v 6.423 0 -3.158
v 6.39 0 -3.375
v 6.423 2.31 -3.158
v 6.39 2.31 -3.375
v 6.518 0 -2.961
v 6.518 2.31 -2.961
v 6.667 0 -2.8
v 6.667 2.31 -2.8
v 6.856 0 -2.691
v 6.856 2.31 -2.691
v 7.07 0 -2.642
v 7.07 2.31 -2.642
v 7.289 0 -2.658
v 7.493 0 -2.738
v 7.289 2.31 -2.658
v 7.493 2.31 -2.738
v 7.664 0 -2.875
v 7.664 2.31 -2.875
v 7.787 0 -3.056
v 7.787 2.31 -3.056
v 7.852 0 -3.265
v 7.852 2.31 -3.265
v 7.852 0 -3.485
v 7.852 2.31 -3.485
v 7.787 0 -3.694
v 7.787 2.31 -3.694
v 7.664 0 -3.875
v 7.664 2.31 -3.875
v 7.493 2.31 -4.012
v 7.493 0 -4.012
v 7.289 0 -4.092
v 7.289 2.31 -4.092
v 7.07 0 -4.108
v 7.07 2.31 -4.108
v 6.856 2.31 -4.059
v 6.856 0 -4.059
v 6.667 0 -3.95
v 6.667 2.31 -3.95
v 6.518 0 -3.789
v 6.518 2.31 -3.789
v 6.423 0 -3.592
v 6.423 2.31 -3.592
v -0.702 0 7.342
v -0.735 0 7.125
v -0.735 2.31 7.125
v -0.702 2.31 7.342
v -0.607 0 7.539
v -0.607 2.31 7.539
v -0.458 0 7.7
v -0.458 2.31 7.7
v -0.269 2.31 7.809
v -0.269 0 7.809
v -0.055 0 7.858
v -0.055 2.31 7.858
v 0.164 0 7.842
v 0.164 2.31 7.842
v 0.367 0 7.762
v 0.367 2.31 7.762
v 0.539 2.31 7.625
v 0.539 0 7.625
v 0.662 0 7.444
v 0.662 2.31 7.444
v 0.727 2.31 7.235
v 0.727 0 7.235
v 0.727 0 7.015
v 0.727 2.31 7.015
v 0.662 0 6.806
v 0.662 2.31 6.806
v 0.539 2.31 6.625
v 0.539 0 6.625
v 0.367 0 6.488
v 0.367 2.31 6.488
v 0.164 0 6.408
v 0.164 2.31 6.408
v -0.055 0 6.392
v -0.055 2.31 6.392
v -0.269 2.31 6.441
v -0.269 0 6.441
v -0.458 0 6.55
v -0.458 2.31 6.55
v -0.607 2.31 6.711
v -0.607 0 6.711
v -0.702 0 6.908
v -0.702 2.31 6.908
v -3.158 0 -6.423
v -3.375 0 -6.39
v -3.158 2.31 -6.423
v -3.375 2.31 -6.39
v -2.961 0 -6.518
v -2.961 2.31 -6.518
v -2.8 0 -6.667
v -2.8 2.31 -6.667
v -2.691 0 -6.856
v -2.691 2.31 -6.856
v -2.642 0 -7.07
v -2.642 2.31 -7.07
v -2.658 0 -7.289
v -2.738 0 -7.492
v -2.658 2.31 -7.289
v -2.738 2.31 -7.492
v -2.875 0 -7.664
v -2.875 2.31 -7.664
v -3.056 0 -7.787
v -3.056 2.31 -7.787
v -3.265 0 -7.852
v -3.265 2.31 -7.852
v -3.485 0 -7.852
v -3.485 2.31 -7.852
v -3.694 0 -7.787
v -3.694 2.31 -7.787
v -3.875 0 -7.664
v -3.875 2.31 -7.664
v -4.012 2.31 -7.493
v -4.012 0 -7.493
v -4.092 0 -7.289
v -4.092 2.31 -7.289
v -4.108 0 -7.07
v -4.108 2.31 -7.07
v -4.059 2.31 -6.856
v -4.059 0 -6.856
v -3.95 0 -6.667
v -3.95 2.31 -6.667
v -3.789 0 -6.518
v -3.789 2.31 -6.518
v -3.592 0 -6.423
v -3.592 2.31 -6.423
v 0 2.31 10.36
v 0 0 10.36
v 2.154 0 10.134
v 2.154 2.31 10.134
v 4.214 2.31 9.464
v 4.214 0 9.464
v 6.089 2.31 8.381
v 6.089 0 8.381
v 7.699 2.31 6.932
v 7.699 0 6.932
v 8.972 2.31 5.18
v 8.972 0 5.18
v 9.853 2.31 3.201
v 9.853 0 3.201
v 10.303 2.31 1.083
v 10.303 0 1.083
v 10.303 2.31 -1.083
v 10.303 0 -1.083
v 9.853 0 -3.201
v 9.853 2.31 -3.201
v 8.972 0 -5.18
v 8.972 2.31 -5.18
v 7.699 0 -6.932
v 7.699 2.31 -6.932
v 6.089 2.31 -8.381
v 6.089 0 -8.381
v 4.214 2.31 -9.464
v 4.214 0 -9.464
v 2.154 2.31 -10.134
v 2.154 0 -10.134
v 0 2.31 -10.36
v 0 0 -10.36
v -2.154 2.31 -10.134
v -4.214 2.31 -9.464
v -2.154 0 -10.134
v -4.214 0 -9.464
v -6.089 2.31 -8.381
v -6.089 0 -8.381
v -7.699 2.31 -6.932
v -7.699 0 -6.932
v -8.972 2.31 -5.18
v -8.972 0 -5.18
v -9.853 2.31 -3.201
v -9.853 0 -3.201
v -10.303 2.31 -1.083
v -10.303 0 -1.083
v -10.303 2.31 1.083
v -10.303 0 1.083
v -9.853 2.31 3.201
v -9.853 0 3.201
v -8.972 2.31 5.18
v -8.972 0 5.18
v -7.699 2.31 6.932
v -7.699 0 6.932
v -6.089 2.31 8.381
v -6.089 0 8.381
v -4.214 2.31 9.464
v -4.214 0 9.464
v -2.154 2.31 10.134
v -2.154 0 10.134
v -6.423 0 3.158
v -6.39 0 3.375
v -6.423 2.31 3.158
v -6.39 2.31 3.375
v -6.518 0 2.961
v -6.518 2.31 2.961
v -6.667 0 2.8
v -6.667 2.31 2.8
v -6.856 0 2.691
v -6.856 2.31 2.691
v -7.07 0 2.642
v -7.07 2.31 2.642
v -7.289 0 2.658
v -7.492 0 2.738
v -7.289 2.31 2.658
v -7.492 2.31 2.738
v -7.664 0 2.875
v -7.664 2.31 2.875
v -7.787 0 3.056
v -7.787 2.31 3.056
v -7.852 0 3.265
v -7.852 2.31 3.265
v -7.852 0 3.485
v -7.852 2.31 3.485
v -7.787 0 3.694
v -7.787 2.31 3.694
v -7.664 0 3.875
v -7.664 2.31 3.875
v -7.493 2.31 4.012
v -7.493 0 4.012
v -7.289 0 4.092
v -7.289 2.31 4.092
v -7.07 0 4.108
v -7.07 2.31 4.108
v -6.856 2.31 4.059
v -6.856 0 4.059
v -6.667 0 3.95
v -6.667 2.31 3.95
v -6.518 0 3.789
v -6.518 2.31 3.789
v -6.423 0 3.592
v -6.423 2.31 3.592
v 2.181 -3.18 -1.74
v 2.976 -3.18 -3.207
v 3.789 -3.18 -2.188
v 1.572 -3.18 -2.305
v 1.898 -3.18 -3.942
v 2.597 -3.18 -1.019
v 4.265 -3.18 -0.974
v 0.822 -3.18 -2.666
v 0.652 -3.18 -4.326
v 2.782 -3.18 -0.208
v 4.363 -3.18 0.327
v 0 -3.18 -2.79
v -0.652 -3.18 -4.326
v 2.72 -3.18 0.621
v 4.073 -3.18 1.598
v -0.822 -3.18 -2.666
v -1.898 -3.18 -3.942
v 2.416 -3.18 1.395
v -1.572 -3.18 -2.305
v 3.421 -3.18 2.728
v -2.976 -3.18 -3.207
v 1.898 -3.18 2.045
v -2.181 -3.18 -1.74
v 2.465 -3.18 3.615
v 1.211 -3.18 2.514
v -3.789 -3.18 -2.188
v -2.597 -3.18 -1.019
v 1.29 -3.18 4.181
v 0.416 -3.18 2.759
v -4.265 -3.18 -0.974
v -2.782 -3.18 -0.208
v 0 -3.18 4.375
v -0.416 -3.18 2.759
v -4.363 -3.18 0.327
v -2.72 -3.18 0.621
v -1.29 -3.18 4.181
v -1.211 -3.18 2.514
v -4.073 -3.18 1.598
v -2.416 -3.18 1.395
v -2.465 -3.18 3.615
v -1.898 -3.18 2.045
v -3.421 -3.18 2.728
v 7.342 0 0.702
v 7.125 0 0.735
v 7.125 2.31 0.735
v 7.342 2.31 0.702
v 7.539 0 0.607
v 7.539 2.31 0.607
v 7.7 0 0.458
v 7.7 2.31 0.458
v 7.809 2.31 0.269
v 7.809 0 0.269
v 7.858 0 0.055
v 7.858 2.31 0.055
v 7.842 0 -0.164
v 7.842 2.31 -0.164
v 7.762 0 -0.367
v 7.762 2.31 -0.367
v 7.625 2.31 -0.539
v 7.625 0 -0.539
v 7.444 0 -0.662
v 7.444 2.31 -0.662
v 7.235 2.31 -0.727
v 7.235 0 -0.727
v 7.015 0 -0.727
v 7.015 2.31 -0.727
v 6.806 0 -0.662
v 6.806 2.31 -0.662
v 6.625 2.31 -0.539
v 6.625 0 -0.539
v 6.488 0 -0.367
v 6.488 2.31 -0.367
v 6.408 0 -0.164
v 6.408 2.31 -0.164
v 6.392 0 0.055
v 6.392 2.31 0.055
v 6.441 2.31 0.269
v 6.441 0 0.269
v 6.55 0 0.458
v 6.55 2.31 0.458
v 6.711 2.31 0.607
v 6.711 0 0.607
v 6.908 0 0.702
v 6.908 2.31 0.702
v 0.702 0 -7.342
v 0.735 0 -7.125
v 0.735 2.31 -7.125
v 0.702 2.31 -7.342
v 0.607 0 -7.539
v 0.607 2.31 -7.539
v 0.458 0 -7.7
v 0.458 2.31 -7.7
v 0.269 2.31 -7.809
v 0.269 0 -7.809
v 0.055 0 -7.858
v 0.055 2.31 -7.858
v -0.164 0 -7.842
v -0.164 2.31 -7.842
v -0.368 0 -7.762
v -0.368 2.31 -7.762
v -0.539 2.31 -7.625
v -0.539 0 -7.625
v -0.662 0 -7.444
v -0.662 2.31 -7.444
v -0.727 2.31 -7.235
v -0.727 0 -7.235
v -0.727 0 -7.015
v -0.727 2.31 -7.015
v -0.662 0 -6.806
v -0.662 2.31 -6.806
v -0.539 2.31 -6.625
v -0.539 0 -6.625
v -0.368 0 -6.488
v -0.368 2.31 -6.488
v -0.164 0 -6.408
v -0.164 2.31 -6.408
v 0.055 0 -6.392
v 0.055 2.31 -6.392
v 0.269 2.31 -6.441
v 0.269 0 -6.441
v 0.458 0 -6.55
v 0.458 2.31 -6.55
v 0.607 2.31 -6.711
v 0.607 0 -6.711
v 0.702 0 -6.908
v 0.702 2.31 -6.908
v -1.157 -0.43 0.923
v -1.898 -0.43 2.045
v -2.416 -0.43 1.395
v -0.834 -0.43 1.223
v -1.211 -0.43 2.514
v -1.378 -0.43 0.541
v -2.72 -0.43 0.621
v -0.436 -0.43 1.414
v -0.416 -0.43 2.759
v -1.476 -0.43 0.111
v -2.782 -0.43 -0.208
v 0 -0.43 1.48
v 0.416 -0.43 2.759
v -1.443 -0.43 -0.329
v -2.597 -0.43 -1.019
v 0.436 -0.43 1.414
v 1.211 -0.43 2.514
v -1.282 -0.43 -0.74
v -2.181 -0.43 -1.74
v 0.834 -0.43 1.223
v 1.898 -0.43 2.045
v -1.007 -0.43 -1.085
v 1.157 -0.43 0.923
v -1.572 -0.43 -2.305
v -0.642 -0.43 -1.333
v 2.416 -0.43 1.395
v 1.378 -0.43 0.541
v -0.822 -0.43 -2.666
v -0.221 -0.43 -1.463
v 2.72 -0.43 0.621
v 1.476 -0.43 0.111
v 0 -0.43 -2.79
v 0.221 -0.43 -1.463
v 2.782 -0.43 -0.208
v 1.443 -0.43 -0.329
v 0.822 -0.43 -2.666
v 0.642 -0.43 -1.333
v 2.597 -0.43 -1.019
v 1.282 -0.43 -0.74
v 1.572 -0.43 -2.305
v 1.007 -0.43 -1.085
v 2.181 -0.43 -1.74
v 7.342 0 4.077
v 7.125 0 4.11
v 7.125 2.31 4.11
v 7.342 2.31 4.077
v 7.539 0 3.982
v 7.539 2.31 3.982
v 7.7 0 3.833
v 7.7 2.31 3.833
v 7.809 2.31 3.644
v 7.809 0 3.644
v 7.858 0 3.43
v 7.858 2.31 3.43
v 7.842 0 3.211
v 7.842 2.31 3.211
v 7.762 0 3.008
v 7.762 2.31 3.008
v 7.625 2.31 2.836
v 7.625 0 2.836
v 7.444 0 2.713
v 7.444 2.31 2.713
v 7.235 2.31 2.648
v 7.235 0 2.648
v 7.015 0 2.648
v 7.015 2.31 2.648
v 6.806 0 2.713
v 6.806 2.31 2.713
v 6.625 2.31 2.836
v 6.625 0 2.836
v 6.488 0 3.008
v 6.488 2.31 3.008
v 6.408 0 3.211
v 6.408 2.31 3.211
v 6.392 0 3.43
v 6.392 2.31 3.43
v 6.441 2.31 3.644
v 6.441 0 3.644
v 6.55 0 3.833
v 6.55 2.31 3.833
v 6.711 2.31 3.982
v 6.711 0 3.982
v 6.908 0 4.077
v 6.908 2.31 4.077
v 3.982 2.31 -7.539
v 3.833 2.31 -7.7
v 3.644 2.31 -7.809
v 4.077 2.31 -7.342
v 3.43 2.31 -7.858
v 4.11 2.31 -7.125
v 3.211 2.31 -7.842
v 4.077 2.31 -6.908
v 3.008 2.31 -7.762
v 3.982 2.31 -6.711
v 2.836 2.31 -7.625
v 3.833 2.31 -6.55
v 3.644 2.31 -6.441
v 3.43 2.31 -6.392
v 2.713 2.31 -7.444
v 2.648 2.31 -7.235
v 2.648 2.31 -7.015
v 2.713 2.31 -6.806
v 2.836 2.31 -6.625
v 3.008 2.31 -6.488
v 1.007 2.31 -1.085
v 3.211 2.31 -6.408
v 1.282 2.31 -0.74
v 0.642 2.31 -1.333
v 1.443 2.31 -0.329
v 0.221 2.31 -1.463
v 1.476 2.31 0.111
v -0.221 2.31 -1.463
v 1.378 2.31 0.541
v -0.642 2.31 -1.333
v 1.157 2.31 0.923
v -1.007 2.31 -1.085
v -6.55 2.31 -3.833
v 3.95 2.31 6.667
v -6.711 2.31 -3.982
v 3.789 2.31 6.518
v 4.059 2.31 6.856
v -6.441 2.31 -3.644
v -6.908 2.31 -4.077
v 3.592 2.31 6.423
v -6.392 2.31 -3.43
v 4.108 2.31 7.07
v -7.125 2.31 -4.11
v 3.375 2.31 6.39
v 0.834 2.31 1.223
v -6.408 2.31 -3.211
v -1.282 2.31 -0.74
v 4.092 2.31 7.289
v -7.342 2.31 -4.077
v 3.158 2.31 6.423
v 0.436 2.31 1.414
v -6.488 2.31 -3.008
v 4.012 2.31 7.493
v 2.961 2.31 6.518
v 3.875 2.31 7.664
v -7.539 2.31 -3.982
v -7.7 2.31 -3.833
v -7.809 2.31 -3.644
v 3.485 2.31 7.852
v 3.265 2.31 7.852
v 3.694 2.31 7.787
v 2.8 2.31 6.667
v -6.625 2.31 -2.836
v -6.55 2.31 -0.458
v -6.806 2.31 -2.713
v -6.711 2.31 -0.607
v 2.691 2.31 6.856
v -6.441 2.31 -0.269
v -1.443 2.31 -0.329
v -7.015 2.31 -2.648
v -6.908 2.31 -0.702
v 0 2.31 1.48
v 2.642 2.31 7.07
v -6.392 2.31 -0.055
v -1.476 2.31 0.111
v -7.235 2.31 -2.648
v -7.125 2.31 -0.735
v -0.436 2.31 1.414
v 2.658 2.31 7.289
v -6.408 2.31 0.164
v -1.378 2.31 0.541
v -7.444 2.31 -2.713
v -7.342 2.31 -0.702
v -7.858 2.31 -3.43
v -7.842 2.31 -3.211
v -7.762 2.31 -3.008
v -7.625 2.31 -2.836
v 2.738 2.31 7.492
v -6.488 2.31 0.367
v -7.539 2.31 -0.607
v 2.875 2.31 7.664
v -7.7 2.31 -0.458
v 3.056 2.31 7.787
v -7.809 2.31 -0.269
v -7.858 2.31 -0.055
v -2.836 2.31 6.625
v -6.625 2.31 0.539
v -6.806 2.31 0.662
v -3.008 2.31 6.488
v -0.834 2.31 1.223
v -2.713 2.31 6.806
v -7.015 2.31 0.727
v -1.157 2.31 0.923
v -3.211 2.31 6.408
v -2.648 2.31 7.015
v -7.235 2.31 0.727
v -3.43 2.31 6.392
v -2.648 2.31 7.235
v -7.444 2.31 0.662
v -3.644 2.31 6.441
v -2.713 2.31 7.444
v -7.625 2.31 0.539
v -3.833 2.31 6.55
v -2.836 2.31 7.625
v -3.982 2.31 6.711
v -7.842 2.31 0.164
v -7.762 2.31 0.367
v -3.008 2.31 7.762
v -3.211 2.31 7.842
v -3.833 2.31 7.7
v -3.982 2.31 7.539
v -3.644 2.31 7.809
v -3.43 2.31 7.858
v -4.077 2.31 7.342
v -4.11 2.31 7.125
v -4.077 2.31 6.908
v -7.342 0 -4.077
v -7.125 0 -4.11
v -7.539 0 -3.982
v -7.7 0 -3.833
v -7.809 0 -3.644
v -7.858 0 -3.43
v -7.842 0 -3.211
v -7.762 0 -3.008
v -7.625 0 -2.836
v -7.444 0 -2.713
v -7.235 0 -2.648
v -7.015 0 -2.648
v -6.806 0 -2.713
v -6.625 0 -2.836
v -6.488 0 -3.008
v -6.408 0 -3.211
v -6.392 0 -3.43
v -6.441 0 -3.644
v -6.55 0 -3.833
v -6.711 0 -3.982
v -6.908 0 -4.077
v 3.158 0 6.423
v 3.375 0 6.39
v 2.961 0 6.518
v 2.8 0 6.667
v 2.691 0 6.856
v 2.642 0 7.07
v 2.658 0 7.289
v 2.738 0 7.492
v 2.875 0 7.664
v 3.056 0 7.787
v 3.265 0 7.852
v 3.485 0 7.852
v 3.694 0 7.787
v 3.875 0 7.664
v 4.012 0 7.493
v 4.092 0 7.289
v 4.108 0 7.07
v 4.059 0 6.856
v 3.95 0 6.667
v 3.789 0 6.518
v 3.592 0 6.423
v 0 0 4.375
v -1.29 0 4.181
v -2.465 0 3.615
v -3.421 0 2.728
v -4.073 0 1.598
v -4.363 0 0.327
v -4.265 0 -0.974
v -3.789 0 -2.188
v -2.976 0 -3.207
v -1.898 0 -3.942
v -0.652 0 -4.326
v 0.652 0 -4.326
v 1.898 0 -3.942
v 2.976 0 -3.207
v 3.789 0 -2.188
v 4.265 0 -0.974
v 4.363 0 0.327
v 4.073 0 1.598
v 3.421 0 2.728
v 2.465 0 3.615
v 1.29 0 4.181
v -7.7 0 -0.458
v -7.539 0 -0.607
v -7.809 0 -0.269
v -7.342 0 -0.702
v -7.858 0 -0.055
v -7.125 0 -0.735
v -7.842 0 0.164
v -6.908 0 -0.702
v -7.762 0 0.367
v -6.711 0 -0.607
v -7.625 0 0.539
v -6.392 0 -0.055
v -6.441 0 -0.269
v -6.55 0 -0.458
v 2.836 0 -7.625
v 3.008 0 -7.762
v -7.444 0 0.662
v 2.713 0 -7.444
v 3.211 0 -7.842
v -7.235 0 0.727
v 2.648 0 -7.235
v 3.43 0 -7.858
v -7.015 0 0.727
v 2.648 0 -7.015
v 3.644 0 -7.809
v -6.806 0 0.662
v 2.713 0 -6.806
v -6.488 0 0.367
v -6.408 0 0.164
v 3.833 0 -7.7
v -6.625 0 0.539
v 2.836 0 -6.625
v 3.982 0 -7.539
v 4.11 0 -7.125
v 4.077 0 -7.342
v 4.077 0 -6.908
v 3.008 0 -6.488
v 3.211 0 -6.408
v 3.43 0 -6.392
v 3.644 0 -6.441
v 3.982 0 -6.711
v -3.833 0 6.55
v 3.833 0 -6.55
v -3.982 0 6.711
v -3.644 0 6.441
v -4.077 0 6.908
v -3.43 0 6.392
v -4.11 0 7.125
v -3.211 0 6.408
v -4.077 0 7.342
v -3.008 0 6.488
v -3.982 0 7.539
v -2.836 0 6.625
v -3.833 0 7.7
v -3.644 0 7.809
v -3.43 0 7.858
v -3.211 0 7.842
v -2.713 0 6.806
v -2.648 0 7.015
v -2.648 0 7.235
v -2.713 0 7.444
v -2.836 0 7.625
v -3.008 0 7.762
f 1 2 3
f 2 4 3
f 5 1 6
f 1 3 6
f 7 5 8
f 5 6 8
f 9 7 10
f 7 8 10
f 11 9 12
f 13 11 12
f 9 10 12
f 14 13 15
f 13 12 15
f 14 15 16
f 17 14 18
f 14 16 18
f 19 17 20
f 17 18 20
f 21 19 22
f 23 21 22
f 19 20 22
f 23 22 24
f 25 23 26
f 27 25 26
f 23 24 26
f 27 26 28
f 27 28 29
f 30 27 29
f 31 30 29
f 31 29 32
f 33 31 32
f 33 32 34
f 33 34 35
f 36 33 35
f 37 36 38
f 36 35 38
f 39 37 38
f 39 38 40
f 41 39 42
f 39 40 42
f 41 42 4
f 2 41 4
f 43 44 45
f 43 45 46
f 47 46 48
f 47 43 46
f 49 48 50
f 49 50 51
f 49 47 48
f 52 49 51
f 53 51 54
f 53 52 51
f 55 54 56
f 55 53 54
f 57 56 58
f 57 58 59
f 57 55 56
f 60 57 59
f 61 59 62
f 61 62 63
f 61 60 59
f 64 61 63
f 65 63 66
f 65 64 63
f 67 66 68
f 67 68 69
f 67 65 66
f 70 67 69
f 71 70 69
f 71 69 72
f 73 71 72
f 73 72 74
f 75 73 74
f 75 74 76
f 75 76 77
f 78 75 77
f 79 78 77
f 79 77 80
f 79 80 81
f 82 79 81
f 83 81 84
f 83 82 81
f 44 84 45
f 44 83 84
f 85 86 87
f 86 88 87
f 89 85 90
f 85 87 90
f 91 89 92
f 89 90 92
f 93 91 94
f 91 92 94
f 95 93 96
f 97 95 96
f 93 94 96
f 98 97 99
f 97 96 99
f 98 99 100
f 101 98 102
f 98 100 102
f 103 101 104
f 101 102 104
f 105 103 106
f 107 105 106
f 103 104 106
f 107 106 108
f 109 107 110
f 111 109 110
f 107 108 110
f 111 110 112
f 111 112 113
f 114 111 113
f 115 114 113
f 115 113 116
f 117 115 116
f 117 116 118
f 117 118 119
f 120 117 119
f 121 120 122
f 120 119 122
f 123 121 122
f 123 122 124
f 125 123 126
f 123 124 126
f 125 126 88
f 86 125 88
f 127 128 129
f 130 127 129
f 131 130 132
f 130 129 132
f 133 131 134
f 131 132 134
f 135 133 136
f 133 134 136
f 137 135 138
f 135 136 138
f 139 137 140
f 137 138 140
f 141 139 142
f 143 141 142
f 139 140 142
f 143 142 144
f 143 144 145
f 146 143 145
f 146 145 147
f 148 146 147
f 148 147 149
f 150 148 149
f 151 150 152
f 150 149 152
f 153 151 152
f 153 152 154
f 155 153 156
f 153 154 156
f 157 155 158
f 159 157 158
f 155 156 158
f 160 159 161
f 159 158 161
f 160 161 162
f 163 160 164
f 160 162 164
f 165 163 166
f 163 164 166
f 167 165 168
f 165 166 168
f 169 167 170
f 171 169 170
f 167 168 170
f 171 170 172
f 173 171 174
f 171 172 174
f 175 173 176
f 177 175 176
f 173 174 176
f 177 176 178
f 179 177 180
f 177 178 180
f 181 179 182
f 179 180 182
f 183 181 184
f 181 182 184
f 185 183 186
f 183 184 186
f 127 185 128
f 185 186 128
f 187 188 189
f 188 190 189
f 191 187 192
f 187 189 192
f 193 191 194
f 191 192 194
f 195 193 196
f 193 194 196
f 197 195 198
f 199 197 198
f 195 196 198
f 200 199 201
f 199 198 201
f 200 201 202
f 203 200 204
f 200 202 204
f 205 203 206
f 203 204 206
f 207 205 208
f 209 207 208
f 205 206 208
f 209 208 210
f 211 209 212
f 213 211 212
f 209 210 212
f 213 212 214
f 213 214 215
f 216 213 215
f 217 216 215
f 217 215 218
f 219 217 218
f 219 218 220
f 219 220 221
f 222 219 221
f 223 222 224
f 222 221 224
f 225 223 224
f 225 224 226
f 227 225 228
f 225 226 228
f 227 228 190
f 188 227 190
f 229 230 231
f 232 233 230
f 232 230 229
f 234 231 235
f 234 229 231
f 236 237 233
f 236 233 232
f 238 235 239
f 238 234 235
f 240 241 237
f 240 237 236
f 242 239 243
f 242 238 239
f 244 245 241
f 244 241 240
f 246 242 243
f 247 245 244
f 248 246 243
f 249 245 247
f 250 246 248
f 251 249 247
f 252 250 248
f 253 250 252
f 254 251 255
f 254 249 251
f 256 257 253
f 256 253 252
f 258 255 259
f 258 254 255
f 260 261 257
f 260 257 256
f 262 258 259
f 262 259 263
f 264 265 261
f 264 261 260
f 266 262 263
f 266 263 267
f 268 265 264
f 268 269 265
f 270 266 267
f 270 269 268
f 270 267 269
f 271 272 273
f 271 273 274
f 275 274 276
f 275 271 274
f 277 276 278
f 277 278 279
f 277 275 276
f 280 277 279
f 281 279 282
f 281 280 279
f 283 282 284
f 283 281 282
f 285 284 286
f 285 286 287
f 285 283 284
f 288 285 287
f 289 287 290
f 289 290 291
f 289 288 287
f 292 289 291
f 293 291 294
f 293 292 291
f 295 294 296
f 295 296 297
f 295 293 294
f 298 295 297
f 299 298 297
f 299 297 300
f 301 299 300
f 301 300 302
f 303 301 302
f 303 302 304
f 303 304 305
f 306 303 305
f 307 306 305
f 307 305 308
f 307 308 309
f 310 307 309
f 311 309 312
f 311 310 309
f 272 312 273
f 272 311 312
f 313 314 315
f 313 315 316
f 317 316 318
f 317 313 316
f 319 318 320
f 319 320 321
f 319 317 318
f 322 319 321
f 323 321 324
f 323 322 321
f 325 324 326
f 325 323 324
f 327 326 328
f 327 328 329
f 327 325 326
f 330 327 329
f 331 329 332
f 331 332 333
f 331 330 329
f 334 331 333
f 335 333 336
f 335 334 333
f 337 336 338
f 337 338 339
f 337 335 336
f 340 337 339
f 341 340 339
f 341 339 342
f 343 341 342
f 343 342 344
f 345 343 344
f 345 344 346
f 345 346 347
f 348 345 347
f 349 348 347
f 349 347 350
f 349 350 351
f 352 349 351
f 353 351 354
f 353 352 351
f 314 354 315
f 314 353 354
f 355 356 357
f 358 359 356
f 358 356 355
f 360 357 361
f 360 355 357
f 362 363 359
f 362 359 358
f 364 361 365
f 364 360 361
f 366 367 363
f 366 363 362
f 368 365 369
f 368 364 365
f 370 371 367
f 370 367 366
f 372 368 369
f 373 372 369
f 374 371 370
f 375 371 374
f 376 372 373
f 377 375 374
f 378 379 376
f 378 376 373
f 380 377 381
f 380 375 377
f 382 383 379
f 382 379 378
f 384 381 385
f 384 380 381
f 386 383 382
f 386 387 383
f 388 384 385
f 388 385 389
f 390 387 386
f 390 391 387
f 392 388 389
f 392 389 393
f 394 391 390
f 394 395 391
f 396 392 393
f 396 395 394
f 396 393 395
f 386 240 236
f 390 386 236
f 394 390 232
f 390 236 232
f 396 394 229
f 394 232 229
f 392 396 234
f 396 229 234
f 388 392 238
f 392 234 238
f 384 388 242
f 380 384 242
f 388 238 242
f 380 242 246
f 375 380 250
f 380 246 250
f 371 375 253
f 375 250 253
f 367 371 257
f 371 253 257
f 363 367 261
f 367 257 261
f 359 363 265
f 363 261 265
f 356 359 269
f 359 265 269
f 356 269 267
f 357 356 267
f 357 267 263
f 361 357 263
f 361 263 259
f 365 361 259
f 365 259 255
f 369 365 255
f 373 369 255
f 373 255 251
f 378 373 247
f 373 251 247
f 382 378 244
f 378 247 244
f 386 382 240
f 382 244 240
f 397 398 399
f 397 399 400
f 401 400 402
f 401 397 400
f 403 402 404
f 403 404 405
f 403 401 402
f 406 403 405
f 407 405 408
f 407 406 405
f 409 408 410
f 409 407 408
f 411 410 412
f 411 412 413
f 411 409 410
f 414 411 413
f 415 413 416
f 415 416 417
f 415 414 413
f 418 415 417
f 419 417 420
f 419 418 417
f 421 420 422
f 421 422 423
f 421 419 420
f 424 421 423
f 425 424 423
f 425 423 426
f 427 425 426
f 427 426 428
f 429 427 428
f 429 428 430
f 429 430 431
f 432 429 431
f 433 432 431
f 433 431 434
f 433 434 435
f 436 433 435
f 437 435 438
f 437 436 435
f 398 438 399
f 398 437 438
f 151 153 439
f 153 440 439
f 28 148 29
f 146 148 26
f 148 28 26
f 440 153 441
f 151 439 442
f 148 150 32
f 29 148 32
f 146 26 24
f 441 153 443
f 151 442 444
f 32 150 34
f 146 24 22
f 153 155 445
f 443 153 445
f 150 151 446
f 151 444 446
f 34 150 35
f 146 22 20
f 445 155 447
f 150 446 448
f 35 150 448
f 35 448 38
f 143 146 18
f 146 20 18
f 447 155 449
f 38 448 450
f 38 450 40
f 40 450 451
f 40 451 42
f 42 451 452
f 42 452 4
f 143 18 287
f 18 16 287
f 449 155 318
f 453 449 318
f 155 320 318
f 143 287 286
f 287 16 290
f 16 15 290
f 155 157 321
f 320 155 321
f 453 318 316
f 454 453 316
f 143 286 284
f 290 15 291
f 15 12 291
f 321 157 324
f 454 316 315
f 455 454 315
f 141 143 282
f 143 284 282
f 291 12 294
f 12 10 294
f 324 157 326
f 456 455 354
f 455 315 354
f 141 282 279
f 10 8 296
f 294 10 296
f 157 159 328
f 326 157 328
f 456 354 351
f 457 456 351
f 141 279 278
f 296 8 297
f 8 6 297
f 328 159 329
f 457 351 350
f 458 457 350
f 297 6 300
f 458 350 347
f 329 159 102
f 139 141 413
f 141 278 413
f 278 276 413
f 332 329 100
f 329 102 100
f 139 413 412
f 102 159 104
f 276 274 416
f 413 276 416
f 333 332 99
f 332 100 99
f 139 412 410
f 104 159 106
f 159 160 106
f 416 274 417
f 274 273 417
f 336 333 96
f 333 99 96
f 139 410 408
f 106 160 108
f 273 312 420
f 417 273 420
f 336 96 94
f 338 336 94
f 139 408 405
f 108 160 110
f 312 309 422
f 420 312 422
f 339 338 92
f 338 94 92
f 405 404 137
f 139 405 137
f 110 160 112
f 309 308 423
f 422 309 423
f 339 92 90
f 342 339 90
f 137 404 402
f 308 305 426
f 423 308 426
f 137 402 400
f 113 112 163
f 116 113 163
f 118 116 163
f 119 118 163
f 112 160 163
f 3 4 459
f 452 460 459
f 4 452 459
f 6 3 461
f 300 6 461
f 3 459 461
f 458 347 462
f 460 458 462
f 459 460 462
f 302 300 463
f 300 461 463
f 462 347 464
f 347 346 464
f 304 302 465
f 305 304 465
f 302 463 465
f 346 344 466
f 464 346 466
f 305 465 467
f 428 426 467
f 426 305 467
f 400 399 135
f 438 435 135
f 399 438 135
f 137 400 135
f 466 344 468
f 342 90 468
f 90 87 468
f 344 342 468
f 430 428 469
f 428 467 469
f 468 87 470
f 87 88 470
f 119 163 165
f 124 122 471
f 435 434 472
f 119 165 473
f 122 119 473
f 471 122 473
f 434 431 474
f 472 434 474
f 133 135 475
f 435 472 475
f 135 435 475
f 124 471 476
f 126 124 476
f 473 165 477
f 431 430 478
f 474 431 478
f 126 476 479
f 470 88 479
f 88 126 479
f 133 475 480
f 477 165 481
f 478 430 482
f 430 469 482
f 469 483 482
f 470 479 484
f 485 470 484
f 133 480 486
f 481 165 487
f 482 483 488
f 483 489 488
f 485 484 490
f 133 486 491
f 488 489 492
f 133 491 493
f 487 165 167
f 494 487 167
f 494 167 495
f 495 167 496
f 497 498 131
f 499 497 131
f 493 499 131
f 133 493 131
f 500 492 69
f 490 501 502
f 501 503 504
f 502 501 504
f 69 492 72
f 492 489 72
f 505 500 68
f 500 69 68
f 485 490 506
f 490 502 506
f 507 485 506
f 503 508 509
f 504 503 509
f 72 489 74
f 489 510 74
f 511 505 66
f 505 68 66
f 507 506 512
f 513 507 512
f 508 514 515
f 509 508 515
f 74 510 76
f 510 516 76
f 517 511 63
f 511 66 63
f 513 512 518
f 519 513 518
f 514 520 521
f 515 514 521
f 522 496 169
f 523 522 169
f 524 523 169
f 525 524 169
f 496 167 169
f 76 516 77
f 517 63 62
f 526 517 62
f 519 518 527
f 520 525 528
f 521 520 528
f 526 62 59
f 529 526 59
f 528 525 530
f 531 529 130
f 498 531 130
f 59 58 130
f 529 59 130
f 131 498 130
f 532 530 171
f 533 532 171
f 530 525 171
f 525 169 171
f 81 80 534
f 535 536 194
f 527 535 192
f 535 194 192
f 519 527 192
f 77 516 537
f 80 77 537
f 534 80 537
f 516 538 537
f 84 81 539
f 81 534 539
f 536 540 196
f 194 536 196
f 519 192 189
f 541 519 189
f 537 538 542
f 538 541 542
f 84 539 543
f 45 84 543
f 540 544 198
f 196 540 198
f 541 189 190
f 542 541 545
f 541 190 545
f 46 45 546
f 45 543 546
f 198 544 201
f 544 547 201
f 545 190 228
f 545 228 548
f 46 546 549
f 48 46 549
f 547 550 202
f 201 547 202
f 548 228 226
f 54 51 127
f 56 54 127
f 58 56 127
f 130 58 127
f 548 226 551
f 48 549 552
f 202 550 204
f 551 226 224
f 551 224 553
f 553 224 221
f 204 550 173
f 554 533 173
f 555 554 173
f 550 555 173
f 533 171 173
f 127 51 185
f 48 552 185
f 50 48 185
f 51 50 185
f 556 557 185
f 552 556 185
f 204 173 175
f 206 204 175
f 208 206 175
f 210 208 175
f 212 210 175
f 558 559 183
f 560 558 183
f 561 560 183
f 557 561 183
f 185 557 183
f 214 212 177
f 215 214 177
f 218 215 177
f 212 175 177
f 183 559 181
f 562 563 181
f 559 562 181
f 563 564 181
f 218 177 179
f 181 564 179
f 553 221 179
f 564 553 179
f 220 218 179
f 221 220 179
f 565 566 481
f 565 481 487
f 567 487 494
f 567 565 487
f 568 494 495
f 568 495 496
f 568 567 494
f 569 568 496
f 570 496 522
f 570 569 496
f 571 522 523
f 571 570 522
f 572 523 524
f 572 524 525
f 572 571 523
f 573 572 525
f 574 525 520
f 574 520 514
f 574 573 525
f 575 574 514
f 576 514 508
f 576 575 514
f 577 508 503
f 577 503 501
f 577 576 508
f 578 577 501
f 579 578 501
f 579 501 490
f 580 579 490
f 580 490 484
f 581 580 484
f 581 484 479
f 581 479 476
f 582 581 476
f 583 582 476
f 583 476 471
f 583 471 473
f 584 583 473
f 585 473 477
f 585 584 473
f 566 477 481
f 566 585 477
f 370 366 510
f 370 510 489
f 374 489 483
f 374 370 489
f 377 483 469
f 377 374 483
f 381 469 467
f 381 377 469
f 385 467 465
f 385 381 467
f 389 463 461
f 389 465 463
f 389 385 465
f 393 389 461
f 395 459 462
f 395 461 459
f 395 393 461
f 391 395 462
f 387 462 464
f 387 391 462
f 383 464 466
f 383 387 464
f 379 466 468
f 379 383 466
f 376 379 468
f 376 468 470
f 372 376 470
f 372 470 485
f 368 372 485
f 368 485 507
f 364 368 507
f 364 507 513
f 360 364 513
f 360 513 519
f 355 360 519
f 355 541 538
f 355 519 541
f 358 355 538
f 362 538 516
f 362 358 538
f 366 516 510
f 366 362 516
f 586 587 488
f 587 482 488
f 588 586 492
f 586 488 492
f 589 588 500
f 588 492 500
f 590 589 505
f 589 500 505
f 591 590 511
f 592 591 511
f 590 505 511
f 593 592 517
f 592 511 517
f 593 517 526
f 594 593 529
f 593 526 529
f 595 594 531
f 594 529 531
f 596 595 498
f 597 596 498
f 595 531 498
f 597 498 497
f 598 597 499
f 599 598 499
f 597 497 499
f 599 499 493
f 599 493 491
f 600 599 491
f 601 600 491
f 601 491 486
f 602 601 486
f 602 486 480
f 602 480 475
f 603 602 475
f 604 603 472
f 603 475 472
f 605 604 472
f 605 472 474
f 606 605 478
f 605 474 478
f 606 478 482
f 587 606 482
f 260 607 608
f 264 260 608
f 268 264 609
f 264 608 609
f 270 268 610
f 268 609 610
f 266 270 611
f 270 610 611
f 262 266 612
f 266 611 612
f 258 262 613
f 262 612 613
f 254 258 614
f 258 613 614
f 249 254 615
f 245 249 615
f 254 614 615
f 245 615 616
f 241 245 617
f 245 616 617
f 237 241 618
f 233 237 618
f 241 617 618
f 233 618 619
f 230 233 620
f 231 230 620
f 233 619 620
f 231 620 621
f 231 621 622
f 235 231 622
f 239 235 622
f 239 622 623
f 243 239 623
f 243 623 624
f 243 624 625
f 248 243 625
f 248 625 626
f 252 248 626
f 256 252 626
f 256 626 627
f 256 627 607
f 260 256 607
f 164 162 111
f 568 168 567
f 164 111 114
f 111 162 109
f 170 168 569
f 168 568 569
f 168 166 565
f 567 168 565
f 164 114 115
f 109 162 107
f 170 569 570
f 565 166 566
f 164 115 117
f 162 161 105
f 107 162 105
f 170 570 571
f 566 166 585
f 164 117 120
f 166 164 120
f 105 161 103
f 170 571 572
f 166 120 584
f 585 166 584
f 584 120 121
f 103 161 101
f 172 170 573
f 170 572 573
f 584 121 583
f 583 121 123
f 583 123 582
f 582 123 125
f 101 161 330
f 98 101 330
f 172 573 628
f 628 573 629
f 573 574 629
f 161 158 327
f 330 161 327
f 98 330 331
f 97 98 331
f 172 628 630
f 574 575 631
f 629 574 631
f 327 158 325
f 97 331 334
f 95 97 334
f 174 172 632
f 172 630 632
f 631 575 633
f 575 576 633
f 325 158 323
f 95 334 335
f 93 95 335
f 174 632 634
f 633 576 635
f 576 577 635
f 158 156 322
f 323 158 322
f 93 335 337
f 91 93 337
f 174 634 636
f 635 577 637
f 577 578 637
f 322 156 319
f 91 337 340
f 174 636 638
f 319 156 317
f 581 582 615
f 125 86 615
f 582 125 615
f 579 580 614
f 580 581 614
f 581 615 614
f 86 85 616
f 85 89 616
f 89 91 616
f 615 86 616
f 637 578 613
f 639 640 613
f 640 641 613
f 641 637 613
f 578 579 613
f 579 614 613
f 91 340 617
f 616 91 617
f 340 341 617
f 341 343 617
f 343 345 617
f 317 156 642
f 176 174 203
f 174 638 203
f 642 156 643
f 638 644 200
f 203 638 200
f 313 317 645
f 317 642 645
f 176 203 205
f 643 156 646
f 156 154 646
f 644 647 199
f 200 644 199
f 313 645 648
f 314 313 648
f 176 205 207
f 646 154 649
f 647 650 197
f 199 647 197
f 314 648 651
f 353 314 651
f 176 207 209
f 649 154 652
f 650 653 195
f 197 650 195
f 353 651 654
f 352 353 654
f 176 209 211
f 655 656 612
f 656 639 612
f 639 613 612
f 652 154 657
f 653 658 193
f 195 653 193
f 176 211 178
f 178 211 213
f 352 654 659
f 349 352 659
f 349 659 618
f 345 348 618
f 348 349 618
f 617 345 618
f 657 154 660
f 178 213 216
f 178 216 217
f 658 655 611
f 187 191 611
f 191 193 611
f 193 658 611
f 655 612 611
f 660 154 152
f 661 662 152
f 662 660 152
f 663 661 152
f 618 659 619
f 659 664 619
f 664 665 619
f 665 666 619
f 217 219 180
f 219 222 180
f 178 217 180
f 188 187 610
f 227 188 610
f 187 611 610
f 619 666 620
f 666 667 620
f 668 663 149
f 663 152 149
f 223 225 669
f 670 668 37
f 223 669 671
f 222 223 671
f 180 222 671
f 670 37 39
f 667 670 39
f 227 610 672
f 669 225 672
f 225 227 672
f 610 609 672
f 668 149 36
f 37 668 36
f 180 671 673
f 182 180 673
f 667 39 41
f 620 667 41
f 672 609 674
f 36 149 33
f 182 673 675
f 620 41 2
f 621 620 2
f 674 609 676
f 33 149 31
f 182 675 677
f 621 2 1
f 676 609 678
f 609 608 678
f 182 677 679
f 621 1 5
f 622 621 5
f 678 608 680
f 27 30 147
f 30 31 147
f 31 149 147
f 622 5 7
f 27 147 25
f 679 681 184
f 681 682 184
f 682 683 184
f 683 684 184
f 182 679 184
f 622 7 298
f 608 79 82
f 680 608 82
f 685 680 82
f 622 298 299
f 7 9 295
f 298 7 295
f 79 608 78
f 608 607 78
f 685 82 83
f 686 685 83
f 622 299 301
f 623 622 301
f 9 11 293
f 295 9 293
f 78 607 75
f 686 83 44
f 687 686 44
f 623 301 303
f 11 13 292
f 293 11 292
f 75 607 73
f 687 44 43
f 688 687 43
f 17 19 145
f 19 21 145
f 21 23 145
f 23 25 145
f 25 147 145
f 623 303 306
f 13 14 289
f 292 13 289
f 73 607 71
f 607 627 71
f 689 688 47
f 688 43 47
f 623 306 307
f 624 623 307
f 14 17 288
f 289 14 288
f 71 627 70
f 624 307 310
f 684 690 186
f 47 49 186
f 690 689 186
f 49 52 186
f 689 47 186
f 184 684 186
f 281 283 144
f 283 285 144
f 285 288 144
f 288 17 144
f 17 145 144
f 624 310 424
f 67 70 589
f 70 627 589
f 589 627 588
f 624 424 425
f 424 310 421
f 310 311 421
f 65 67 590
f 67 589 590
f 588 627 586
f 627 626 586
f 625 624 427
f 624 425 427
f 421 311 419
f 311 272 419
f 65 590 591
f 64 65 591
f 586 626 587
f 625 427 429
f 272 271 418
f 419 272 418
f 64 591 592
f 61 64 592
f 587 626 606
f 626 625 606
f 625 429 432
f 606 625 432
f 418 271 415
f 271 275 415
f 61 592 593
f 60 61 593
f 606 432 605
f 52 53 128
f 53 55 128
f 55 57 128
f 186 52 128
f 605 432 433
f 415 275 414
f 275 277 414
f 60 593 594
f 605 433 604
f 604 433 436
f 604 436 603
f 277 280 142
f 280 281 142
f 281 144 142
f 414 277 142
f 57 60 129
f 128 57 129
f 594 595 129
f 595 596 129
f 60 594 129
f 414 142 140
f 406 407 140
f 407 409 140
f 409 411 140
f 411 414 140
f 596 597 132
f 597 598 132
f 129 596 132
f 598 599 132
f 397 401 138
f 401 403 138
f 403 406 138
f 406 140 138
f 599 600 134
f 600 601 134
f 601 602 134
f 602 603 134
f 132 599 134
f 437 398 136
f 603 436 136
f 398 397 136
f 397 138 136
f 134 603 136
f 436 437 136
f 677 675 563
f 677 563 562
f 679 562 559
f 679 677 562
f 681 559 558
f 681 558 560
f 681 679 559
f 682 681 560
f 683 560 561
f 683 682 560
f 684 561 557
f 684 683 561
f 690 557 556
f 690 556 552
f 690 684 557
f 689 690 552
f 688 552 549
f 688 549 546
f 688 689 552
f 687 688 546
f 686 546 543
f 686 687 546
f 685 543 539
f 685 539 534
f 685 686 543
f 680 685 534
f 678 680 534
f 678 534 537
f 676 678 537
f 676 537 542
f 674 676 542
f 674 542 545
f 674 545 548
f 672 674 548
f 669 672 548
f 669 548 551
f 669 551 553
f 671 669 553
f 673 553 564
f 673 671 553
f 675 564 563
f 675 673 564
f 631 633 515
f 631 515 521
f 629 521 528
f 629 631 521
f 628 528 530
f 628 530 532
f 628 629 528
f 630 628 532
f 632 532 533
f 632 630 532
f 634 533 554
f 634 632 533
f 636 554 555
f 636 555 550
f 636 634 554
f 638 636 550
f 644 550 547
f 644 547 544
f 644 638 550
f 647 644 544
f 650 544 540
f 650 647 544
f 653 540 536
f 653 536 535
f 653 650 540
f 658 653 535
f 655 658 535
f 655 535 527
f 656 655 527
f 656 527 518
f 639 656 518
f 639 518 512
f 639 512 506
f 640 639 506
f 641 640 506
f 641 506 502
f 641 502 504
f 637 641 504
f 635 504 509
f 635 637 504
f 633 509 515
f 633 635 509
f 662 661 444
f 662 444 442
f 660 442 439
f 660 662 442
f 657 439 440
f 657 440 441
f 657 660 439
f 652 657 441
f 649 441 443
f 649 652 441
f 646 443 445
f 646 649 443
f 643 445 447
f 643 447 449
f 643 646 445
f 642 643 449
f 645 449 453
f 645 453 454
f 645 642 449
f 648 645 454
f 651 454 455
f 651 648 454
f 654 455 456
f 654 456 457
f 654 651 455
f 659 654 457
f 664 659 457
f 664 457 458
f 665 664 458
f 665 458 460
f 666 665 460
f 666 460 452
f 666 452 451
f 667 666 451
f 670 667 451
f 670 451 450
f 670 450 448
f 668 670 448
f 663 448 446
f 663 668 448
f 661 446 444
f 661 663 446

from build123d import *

# Parameters (mm, degrees)
SKETCH1_R               = 10.36
BOSS_EXTRUDE1_DEPTH     = 2.31
BOSS_EXTRUDE2_START     = -2.31
SKETCH2_R               = 4.375
BOSS_EXTRUDE2_DEPTH     = 5.49
CUT_EXTRUDE1_DEPTH      = 16.646063403
CUT_EXTRUDE1_DEPTH_BACK = 16.646063403
SKETCH5_R               = 1.48
SKETCH6_R               = 2.79
CUT_EXTRUDE2_DEPTH      = 2.75
SKETCH7_R               = 0.735
CUT_EXTRUDE3_DEPTH      = 15.992384734
CRVPATTERN2_OUTLINE_R   = 0.735
CRVPATTERN2_DEPTH       = 2.31
CIRPATTERN1_COUNT       = 4


# Read off the part's stored shape, not the designer's step: CrvPattern2
with BuildPart() as part:
    # Sketch1 → Boss-Extrude1 (new body)
    with BuildSketch(Plane(origin=(0, 0, 0), x_dir=(1, 0, 0), z_dir=(0, 1, 0))):
        with Locations(Location((0, 0, 0), (0, 0, 270))):
            Circle(SKETCH1_R)
    extrude(amount=BOSS_EXTRUDE1_DEPTH)

    # Sketch2 → Boss-Extrude2 (add)
    with BuildSketch(Plane(origin=(0, 0, 0), x_dir=(-1, 0, 0), z_dir=(0, -1, 0)).offset(BOSS_EXTRUDE2_START)):
        with Locations(Location((0, 0, 0), (0, 0, 270))):
            Circle(SKETCH2_R)
    extrude(amount=BOSS_EXTRUDE2_DEPTH)

    # Sketch5 → Cut-Extrude1 (cut, two sides: drawn at the far end of the back side and taken through both)
    with BuildSketch(Plane(origin=(0, 2.31, 0), x_dir=(1, 0, 0), z_dir=(0, 1, 0)).offset(-CUT_EXTRUDE1_DEPTH_BACK)):
        with Locations(Location((0, 0, 0), (0, 0, 270))):
            Circle(SKETCH5_R)
    extrude(amount=CUT_EXTRUDE1_DEPTH + CUT_EXTRUDE1_DEPTH_BACK, mode=Mode.SUBTRACT)

    # Sketch6 → Cut-Extrude2 (cut)
    with BuildSketch(Plane.XZ.offset(3.18)):
        with Locations(Location((0, 0, 0), (0, 0, 270))):
            Circle(SKETCH6_R)
    extrude(amount=-CUT_EXTRUDE2_DEPTH, mode=Mode.SUBTRACT)

    # Sketch7 → Cut-Extrude3 (cut, symmetric)
    with BuildSketch(Plane(origin=(0, 0, 0), x_dir=(1, 0, 0), z_dir=(0, 1, 0))):
        with Locations(Location((-3.375, 7.125, 0), (0, 0, 270))):
            Circle(SKETCH7_R)
    cut_extrude3 = extrude(amount=CUT_EXTRUDE3_DEPTH, both=True, mode=Mode.SUBTRACT)

    # CrvPattern2 outline → CrvPattern2 (cut)
    with BuildSketch(Plane(origin=(0, 0, 0), x_dir=(1, 0, 0), z_dir=(0, 1, 0))):
        with Locations((3.375, 7.125)):
            Circle(CRVPATTERN2_OUTLINE_R)
        with Locations((0, 7.125)):
            Circle(CRVPATTERN2_OUTLINE_R)
    crvpattern2 = extrude(amount=CRVPATTERN2_DEPTH, mode=Mode.SUBTRACT)

    # CirPattern1: Cut-Extrude3, CrvPattern2 ×4 about axis
    cirpattern1_axis = Axis((0, 0, 0), (0, 1, 0))
    add([cut_extrude3.rotate(cirpattern1_axis, i * 360 / CIRPATTERN1_COUNT) for i in range(1, CIRPATTERN1_COUNT)], mode=Mode.SUBTRACT)
    add([crvpattern2.rotate(cirpattern1_axis, i * 360 / CIRPATTERN1_COUNT) for i in range(1, CIRPATTERN1_COUNT)], mode=Mode.SUBTRACT)


solid = part.part
